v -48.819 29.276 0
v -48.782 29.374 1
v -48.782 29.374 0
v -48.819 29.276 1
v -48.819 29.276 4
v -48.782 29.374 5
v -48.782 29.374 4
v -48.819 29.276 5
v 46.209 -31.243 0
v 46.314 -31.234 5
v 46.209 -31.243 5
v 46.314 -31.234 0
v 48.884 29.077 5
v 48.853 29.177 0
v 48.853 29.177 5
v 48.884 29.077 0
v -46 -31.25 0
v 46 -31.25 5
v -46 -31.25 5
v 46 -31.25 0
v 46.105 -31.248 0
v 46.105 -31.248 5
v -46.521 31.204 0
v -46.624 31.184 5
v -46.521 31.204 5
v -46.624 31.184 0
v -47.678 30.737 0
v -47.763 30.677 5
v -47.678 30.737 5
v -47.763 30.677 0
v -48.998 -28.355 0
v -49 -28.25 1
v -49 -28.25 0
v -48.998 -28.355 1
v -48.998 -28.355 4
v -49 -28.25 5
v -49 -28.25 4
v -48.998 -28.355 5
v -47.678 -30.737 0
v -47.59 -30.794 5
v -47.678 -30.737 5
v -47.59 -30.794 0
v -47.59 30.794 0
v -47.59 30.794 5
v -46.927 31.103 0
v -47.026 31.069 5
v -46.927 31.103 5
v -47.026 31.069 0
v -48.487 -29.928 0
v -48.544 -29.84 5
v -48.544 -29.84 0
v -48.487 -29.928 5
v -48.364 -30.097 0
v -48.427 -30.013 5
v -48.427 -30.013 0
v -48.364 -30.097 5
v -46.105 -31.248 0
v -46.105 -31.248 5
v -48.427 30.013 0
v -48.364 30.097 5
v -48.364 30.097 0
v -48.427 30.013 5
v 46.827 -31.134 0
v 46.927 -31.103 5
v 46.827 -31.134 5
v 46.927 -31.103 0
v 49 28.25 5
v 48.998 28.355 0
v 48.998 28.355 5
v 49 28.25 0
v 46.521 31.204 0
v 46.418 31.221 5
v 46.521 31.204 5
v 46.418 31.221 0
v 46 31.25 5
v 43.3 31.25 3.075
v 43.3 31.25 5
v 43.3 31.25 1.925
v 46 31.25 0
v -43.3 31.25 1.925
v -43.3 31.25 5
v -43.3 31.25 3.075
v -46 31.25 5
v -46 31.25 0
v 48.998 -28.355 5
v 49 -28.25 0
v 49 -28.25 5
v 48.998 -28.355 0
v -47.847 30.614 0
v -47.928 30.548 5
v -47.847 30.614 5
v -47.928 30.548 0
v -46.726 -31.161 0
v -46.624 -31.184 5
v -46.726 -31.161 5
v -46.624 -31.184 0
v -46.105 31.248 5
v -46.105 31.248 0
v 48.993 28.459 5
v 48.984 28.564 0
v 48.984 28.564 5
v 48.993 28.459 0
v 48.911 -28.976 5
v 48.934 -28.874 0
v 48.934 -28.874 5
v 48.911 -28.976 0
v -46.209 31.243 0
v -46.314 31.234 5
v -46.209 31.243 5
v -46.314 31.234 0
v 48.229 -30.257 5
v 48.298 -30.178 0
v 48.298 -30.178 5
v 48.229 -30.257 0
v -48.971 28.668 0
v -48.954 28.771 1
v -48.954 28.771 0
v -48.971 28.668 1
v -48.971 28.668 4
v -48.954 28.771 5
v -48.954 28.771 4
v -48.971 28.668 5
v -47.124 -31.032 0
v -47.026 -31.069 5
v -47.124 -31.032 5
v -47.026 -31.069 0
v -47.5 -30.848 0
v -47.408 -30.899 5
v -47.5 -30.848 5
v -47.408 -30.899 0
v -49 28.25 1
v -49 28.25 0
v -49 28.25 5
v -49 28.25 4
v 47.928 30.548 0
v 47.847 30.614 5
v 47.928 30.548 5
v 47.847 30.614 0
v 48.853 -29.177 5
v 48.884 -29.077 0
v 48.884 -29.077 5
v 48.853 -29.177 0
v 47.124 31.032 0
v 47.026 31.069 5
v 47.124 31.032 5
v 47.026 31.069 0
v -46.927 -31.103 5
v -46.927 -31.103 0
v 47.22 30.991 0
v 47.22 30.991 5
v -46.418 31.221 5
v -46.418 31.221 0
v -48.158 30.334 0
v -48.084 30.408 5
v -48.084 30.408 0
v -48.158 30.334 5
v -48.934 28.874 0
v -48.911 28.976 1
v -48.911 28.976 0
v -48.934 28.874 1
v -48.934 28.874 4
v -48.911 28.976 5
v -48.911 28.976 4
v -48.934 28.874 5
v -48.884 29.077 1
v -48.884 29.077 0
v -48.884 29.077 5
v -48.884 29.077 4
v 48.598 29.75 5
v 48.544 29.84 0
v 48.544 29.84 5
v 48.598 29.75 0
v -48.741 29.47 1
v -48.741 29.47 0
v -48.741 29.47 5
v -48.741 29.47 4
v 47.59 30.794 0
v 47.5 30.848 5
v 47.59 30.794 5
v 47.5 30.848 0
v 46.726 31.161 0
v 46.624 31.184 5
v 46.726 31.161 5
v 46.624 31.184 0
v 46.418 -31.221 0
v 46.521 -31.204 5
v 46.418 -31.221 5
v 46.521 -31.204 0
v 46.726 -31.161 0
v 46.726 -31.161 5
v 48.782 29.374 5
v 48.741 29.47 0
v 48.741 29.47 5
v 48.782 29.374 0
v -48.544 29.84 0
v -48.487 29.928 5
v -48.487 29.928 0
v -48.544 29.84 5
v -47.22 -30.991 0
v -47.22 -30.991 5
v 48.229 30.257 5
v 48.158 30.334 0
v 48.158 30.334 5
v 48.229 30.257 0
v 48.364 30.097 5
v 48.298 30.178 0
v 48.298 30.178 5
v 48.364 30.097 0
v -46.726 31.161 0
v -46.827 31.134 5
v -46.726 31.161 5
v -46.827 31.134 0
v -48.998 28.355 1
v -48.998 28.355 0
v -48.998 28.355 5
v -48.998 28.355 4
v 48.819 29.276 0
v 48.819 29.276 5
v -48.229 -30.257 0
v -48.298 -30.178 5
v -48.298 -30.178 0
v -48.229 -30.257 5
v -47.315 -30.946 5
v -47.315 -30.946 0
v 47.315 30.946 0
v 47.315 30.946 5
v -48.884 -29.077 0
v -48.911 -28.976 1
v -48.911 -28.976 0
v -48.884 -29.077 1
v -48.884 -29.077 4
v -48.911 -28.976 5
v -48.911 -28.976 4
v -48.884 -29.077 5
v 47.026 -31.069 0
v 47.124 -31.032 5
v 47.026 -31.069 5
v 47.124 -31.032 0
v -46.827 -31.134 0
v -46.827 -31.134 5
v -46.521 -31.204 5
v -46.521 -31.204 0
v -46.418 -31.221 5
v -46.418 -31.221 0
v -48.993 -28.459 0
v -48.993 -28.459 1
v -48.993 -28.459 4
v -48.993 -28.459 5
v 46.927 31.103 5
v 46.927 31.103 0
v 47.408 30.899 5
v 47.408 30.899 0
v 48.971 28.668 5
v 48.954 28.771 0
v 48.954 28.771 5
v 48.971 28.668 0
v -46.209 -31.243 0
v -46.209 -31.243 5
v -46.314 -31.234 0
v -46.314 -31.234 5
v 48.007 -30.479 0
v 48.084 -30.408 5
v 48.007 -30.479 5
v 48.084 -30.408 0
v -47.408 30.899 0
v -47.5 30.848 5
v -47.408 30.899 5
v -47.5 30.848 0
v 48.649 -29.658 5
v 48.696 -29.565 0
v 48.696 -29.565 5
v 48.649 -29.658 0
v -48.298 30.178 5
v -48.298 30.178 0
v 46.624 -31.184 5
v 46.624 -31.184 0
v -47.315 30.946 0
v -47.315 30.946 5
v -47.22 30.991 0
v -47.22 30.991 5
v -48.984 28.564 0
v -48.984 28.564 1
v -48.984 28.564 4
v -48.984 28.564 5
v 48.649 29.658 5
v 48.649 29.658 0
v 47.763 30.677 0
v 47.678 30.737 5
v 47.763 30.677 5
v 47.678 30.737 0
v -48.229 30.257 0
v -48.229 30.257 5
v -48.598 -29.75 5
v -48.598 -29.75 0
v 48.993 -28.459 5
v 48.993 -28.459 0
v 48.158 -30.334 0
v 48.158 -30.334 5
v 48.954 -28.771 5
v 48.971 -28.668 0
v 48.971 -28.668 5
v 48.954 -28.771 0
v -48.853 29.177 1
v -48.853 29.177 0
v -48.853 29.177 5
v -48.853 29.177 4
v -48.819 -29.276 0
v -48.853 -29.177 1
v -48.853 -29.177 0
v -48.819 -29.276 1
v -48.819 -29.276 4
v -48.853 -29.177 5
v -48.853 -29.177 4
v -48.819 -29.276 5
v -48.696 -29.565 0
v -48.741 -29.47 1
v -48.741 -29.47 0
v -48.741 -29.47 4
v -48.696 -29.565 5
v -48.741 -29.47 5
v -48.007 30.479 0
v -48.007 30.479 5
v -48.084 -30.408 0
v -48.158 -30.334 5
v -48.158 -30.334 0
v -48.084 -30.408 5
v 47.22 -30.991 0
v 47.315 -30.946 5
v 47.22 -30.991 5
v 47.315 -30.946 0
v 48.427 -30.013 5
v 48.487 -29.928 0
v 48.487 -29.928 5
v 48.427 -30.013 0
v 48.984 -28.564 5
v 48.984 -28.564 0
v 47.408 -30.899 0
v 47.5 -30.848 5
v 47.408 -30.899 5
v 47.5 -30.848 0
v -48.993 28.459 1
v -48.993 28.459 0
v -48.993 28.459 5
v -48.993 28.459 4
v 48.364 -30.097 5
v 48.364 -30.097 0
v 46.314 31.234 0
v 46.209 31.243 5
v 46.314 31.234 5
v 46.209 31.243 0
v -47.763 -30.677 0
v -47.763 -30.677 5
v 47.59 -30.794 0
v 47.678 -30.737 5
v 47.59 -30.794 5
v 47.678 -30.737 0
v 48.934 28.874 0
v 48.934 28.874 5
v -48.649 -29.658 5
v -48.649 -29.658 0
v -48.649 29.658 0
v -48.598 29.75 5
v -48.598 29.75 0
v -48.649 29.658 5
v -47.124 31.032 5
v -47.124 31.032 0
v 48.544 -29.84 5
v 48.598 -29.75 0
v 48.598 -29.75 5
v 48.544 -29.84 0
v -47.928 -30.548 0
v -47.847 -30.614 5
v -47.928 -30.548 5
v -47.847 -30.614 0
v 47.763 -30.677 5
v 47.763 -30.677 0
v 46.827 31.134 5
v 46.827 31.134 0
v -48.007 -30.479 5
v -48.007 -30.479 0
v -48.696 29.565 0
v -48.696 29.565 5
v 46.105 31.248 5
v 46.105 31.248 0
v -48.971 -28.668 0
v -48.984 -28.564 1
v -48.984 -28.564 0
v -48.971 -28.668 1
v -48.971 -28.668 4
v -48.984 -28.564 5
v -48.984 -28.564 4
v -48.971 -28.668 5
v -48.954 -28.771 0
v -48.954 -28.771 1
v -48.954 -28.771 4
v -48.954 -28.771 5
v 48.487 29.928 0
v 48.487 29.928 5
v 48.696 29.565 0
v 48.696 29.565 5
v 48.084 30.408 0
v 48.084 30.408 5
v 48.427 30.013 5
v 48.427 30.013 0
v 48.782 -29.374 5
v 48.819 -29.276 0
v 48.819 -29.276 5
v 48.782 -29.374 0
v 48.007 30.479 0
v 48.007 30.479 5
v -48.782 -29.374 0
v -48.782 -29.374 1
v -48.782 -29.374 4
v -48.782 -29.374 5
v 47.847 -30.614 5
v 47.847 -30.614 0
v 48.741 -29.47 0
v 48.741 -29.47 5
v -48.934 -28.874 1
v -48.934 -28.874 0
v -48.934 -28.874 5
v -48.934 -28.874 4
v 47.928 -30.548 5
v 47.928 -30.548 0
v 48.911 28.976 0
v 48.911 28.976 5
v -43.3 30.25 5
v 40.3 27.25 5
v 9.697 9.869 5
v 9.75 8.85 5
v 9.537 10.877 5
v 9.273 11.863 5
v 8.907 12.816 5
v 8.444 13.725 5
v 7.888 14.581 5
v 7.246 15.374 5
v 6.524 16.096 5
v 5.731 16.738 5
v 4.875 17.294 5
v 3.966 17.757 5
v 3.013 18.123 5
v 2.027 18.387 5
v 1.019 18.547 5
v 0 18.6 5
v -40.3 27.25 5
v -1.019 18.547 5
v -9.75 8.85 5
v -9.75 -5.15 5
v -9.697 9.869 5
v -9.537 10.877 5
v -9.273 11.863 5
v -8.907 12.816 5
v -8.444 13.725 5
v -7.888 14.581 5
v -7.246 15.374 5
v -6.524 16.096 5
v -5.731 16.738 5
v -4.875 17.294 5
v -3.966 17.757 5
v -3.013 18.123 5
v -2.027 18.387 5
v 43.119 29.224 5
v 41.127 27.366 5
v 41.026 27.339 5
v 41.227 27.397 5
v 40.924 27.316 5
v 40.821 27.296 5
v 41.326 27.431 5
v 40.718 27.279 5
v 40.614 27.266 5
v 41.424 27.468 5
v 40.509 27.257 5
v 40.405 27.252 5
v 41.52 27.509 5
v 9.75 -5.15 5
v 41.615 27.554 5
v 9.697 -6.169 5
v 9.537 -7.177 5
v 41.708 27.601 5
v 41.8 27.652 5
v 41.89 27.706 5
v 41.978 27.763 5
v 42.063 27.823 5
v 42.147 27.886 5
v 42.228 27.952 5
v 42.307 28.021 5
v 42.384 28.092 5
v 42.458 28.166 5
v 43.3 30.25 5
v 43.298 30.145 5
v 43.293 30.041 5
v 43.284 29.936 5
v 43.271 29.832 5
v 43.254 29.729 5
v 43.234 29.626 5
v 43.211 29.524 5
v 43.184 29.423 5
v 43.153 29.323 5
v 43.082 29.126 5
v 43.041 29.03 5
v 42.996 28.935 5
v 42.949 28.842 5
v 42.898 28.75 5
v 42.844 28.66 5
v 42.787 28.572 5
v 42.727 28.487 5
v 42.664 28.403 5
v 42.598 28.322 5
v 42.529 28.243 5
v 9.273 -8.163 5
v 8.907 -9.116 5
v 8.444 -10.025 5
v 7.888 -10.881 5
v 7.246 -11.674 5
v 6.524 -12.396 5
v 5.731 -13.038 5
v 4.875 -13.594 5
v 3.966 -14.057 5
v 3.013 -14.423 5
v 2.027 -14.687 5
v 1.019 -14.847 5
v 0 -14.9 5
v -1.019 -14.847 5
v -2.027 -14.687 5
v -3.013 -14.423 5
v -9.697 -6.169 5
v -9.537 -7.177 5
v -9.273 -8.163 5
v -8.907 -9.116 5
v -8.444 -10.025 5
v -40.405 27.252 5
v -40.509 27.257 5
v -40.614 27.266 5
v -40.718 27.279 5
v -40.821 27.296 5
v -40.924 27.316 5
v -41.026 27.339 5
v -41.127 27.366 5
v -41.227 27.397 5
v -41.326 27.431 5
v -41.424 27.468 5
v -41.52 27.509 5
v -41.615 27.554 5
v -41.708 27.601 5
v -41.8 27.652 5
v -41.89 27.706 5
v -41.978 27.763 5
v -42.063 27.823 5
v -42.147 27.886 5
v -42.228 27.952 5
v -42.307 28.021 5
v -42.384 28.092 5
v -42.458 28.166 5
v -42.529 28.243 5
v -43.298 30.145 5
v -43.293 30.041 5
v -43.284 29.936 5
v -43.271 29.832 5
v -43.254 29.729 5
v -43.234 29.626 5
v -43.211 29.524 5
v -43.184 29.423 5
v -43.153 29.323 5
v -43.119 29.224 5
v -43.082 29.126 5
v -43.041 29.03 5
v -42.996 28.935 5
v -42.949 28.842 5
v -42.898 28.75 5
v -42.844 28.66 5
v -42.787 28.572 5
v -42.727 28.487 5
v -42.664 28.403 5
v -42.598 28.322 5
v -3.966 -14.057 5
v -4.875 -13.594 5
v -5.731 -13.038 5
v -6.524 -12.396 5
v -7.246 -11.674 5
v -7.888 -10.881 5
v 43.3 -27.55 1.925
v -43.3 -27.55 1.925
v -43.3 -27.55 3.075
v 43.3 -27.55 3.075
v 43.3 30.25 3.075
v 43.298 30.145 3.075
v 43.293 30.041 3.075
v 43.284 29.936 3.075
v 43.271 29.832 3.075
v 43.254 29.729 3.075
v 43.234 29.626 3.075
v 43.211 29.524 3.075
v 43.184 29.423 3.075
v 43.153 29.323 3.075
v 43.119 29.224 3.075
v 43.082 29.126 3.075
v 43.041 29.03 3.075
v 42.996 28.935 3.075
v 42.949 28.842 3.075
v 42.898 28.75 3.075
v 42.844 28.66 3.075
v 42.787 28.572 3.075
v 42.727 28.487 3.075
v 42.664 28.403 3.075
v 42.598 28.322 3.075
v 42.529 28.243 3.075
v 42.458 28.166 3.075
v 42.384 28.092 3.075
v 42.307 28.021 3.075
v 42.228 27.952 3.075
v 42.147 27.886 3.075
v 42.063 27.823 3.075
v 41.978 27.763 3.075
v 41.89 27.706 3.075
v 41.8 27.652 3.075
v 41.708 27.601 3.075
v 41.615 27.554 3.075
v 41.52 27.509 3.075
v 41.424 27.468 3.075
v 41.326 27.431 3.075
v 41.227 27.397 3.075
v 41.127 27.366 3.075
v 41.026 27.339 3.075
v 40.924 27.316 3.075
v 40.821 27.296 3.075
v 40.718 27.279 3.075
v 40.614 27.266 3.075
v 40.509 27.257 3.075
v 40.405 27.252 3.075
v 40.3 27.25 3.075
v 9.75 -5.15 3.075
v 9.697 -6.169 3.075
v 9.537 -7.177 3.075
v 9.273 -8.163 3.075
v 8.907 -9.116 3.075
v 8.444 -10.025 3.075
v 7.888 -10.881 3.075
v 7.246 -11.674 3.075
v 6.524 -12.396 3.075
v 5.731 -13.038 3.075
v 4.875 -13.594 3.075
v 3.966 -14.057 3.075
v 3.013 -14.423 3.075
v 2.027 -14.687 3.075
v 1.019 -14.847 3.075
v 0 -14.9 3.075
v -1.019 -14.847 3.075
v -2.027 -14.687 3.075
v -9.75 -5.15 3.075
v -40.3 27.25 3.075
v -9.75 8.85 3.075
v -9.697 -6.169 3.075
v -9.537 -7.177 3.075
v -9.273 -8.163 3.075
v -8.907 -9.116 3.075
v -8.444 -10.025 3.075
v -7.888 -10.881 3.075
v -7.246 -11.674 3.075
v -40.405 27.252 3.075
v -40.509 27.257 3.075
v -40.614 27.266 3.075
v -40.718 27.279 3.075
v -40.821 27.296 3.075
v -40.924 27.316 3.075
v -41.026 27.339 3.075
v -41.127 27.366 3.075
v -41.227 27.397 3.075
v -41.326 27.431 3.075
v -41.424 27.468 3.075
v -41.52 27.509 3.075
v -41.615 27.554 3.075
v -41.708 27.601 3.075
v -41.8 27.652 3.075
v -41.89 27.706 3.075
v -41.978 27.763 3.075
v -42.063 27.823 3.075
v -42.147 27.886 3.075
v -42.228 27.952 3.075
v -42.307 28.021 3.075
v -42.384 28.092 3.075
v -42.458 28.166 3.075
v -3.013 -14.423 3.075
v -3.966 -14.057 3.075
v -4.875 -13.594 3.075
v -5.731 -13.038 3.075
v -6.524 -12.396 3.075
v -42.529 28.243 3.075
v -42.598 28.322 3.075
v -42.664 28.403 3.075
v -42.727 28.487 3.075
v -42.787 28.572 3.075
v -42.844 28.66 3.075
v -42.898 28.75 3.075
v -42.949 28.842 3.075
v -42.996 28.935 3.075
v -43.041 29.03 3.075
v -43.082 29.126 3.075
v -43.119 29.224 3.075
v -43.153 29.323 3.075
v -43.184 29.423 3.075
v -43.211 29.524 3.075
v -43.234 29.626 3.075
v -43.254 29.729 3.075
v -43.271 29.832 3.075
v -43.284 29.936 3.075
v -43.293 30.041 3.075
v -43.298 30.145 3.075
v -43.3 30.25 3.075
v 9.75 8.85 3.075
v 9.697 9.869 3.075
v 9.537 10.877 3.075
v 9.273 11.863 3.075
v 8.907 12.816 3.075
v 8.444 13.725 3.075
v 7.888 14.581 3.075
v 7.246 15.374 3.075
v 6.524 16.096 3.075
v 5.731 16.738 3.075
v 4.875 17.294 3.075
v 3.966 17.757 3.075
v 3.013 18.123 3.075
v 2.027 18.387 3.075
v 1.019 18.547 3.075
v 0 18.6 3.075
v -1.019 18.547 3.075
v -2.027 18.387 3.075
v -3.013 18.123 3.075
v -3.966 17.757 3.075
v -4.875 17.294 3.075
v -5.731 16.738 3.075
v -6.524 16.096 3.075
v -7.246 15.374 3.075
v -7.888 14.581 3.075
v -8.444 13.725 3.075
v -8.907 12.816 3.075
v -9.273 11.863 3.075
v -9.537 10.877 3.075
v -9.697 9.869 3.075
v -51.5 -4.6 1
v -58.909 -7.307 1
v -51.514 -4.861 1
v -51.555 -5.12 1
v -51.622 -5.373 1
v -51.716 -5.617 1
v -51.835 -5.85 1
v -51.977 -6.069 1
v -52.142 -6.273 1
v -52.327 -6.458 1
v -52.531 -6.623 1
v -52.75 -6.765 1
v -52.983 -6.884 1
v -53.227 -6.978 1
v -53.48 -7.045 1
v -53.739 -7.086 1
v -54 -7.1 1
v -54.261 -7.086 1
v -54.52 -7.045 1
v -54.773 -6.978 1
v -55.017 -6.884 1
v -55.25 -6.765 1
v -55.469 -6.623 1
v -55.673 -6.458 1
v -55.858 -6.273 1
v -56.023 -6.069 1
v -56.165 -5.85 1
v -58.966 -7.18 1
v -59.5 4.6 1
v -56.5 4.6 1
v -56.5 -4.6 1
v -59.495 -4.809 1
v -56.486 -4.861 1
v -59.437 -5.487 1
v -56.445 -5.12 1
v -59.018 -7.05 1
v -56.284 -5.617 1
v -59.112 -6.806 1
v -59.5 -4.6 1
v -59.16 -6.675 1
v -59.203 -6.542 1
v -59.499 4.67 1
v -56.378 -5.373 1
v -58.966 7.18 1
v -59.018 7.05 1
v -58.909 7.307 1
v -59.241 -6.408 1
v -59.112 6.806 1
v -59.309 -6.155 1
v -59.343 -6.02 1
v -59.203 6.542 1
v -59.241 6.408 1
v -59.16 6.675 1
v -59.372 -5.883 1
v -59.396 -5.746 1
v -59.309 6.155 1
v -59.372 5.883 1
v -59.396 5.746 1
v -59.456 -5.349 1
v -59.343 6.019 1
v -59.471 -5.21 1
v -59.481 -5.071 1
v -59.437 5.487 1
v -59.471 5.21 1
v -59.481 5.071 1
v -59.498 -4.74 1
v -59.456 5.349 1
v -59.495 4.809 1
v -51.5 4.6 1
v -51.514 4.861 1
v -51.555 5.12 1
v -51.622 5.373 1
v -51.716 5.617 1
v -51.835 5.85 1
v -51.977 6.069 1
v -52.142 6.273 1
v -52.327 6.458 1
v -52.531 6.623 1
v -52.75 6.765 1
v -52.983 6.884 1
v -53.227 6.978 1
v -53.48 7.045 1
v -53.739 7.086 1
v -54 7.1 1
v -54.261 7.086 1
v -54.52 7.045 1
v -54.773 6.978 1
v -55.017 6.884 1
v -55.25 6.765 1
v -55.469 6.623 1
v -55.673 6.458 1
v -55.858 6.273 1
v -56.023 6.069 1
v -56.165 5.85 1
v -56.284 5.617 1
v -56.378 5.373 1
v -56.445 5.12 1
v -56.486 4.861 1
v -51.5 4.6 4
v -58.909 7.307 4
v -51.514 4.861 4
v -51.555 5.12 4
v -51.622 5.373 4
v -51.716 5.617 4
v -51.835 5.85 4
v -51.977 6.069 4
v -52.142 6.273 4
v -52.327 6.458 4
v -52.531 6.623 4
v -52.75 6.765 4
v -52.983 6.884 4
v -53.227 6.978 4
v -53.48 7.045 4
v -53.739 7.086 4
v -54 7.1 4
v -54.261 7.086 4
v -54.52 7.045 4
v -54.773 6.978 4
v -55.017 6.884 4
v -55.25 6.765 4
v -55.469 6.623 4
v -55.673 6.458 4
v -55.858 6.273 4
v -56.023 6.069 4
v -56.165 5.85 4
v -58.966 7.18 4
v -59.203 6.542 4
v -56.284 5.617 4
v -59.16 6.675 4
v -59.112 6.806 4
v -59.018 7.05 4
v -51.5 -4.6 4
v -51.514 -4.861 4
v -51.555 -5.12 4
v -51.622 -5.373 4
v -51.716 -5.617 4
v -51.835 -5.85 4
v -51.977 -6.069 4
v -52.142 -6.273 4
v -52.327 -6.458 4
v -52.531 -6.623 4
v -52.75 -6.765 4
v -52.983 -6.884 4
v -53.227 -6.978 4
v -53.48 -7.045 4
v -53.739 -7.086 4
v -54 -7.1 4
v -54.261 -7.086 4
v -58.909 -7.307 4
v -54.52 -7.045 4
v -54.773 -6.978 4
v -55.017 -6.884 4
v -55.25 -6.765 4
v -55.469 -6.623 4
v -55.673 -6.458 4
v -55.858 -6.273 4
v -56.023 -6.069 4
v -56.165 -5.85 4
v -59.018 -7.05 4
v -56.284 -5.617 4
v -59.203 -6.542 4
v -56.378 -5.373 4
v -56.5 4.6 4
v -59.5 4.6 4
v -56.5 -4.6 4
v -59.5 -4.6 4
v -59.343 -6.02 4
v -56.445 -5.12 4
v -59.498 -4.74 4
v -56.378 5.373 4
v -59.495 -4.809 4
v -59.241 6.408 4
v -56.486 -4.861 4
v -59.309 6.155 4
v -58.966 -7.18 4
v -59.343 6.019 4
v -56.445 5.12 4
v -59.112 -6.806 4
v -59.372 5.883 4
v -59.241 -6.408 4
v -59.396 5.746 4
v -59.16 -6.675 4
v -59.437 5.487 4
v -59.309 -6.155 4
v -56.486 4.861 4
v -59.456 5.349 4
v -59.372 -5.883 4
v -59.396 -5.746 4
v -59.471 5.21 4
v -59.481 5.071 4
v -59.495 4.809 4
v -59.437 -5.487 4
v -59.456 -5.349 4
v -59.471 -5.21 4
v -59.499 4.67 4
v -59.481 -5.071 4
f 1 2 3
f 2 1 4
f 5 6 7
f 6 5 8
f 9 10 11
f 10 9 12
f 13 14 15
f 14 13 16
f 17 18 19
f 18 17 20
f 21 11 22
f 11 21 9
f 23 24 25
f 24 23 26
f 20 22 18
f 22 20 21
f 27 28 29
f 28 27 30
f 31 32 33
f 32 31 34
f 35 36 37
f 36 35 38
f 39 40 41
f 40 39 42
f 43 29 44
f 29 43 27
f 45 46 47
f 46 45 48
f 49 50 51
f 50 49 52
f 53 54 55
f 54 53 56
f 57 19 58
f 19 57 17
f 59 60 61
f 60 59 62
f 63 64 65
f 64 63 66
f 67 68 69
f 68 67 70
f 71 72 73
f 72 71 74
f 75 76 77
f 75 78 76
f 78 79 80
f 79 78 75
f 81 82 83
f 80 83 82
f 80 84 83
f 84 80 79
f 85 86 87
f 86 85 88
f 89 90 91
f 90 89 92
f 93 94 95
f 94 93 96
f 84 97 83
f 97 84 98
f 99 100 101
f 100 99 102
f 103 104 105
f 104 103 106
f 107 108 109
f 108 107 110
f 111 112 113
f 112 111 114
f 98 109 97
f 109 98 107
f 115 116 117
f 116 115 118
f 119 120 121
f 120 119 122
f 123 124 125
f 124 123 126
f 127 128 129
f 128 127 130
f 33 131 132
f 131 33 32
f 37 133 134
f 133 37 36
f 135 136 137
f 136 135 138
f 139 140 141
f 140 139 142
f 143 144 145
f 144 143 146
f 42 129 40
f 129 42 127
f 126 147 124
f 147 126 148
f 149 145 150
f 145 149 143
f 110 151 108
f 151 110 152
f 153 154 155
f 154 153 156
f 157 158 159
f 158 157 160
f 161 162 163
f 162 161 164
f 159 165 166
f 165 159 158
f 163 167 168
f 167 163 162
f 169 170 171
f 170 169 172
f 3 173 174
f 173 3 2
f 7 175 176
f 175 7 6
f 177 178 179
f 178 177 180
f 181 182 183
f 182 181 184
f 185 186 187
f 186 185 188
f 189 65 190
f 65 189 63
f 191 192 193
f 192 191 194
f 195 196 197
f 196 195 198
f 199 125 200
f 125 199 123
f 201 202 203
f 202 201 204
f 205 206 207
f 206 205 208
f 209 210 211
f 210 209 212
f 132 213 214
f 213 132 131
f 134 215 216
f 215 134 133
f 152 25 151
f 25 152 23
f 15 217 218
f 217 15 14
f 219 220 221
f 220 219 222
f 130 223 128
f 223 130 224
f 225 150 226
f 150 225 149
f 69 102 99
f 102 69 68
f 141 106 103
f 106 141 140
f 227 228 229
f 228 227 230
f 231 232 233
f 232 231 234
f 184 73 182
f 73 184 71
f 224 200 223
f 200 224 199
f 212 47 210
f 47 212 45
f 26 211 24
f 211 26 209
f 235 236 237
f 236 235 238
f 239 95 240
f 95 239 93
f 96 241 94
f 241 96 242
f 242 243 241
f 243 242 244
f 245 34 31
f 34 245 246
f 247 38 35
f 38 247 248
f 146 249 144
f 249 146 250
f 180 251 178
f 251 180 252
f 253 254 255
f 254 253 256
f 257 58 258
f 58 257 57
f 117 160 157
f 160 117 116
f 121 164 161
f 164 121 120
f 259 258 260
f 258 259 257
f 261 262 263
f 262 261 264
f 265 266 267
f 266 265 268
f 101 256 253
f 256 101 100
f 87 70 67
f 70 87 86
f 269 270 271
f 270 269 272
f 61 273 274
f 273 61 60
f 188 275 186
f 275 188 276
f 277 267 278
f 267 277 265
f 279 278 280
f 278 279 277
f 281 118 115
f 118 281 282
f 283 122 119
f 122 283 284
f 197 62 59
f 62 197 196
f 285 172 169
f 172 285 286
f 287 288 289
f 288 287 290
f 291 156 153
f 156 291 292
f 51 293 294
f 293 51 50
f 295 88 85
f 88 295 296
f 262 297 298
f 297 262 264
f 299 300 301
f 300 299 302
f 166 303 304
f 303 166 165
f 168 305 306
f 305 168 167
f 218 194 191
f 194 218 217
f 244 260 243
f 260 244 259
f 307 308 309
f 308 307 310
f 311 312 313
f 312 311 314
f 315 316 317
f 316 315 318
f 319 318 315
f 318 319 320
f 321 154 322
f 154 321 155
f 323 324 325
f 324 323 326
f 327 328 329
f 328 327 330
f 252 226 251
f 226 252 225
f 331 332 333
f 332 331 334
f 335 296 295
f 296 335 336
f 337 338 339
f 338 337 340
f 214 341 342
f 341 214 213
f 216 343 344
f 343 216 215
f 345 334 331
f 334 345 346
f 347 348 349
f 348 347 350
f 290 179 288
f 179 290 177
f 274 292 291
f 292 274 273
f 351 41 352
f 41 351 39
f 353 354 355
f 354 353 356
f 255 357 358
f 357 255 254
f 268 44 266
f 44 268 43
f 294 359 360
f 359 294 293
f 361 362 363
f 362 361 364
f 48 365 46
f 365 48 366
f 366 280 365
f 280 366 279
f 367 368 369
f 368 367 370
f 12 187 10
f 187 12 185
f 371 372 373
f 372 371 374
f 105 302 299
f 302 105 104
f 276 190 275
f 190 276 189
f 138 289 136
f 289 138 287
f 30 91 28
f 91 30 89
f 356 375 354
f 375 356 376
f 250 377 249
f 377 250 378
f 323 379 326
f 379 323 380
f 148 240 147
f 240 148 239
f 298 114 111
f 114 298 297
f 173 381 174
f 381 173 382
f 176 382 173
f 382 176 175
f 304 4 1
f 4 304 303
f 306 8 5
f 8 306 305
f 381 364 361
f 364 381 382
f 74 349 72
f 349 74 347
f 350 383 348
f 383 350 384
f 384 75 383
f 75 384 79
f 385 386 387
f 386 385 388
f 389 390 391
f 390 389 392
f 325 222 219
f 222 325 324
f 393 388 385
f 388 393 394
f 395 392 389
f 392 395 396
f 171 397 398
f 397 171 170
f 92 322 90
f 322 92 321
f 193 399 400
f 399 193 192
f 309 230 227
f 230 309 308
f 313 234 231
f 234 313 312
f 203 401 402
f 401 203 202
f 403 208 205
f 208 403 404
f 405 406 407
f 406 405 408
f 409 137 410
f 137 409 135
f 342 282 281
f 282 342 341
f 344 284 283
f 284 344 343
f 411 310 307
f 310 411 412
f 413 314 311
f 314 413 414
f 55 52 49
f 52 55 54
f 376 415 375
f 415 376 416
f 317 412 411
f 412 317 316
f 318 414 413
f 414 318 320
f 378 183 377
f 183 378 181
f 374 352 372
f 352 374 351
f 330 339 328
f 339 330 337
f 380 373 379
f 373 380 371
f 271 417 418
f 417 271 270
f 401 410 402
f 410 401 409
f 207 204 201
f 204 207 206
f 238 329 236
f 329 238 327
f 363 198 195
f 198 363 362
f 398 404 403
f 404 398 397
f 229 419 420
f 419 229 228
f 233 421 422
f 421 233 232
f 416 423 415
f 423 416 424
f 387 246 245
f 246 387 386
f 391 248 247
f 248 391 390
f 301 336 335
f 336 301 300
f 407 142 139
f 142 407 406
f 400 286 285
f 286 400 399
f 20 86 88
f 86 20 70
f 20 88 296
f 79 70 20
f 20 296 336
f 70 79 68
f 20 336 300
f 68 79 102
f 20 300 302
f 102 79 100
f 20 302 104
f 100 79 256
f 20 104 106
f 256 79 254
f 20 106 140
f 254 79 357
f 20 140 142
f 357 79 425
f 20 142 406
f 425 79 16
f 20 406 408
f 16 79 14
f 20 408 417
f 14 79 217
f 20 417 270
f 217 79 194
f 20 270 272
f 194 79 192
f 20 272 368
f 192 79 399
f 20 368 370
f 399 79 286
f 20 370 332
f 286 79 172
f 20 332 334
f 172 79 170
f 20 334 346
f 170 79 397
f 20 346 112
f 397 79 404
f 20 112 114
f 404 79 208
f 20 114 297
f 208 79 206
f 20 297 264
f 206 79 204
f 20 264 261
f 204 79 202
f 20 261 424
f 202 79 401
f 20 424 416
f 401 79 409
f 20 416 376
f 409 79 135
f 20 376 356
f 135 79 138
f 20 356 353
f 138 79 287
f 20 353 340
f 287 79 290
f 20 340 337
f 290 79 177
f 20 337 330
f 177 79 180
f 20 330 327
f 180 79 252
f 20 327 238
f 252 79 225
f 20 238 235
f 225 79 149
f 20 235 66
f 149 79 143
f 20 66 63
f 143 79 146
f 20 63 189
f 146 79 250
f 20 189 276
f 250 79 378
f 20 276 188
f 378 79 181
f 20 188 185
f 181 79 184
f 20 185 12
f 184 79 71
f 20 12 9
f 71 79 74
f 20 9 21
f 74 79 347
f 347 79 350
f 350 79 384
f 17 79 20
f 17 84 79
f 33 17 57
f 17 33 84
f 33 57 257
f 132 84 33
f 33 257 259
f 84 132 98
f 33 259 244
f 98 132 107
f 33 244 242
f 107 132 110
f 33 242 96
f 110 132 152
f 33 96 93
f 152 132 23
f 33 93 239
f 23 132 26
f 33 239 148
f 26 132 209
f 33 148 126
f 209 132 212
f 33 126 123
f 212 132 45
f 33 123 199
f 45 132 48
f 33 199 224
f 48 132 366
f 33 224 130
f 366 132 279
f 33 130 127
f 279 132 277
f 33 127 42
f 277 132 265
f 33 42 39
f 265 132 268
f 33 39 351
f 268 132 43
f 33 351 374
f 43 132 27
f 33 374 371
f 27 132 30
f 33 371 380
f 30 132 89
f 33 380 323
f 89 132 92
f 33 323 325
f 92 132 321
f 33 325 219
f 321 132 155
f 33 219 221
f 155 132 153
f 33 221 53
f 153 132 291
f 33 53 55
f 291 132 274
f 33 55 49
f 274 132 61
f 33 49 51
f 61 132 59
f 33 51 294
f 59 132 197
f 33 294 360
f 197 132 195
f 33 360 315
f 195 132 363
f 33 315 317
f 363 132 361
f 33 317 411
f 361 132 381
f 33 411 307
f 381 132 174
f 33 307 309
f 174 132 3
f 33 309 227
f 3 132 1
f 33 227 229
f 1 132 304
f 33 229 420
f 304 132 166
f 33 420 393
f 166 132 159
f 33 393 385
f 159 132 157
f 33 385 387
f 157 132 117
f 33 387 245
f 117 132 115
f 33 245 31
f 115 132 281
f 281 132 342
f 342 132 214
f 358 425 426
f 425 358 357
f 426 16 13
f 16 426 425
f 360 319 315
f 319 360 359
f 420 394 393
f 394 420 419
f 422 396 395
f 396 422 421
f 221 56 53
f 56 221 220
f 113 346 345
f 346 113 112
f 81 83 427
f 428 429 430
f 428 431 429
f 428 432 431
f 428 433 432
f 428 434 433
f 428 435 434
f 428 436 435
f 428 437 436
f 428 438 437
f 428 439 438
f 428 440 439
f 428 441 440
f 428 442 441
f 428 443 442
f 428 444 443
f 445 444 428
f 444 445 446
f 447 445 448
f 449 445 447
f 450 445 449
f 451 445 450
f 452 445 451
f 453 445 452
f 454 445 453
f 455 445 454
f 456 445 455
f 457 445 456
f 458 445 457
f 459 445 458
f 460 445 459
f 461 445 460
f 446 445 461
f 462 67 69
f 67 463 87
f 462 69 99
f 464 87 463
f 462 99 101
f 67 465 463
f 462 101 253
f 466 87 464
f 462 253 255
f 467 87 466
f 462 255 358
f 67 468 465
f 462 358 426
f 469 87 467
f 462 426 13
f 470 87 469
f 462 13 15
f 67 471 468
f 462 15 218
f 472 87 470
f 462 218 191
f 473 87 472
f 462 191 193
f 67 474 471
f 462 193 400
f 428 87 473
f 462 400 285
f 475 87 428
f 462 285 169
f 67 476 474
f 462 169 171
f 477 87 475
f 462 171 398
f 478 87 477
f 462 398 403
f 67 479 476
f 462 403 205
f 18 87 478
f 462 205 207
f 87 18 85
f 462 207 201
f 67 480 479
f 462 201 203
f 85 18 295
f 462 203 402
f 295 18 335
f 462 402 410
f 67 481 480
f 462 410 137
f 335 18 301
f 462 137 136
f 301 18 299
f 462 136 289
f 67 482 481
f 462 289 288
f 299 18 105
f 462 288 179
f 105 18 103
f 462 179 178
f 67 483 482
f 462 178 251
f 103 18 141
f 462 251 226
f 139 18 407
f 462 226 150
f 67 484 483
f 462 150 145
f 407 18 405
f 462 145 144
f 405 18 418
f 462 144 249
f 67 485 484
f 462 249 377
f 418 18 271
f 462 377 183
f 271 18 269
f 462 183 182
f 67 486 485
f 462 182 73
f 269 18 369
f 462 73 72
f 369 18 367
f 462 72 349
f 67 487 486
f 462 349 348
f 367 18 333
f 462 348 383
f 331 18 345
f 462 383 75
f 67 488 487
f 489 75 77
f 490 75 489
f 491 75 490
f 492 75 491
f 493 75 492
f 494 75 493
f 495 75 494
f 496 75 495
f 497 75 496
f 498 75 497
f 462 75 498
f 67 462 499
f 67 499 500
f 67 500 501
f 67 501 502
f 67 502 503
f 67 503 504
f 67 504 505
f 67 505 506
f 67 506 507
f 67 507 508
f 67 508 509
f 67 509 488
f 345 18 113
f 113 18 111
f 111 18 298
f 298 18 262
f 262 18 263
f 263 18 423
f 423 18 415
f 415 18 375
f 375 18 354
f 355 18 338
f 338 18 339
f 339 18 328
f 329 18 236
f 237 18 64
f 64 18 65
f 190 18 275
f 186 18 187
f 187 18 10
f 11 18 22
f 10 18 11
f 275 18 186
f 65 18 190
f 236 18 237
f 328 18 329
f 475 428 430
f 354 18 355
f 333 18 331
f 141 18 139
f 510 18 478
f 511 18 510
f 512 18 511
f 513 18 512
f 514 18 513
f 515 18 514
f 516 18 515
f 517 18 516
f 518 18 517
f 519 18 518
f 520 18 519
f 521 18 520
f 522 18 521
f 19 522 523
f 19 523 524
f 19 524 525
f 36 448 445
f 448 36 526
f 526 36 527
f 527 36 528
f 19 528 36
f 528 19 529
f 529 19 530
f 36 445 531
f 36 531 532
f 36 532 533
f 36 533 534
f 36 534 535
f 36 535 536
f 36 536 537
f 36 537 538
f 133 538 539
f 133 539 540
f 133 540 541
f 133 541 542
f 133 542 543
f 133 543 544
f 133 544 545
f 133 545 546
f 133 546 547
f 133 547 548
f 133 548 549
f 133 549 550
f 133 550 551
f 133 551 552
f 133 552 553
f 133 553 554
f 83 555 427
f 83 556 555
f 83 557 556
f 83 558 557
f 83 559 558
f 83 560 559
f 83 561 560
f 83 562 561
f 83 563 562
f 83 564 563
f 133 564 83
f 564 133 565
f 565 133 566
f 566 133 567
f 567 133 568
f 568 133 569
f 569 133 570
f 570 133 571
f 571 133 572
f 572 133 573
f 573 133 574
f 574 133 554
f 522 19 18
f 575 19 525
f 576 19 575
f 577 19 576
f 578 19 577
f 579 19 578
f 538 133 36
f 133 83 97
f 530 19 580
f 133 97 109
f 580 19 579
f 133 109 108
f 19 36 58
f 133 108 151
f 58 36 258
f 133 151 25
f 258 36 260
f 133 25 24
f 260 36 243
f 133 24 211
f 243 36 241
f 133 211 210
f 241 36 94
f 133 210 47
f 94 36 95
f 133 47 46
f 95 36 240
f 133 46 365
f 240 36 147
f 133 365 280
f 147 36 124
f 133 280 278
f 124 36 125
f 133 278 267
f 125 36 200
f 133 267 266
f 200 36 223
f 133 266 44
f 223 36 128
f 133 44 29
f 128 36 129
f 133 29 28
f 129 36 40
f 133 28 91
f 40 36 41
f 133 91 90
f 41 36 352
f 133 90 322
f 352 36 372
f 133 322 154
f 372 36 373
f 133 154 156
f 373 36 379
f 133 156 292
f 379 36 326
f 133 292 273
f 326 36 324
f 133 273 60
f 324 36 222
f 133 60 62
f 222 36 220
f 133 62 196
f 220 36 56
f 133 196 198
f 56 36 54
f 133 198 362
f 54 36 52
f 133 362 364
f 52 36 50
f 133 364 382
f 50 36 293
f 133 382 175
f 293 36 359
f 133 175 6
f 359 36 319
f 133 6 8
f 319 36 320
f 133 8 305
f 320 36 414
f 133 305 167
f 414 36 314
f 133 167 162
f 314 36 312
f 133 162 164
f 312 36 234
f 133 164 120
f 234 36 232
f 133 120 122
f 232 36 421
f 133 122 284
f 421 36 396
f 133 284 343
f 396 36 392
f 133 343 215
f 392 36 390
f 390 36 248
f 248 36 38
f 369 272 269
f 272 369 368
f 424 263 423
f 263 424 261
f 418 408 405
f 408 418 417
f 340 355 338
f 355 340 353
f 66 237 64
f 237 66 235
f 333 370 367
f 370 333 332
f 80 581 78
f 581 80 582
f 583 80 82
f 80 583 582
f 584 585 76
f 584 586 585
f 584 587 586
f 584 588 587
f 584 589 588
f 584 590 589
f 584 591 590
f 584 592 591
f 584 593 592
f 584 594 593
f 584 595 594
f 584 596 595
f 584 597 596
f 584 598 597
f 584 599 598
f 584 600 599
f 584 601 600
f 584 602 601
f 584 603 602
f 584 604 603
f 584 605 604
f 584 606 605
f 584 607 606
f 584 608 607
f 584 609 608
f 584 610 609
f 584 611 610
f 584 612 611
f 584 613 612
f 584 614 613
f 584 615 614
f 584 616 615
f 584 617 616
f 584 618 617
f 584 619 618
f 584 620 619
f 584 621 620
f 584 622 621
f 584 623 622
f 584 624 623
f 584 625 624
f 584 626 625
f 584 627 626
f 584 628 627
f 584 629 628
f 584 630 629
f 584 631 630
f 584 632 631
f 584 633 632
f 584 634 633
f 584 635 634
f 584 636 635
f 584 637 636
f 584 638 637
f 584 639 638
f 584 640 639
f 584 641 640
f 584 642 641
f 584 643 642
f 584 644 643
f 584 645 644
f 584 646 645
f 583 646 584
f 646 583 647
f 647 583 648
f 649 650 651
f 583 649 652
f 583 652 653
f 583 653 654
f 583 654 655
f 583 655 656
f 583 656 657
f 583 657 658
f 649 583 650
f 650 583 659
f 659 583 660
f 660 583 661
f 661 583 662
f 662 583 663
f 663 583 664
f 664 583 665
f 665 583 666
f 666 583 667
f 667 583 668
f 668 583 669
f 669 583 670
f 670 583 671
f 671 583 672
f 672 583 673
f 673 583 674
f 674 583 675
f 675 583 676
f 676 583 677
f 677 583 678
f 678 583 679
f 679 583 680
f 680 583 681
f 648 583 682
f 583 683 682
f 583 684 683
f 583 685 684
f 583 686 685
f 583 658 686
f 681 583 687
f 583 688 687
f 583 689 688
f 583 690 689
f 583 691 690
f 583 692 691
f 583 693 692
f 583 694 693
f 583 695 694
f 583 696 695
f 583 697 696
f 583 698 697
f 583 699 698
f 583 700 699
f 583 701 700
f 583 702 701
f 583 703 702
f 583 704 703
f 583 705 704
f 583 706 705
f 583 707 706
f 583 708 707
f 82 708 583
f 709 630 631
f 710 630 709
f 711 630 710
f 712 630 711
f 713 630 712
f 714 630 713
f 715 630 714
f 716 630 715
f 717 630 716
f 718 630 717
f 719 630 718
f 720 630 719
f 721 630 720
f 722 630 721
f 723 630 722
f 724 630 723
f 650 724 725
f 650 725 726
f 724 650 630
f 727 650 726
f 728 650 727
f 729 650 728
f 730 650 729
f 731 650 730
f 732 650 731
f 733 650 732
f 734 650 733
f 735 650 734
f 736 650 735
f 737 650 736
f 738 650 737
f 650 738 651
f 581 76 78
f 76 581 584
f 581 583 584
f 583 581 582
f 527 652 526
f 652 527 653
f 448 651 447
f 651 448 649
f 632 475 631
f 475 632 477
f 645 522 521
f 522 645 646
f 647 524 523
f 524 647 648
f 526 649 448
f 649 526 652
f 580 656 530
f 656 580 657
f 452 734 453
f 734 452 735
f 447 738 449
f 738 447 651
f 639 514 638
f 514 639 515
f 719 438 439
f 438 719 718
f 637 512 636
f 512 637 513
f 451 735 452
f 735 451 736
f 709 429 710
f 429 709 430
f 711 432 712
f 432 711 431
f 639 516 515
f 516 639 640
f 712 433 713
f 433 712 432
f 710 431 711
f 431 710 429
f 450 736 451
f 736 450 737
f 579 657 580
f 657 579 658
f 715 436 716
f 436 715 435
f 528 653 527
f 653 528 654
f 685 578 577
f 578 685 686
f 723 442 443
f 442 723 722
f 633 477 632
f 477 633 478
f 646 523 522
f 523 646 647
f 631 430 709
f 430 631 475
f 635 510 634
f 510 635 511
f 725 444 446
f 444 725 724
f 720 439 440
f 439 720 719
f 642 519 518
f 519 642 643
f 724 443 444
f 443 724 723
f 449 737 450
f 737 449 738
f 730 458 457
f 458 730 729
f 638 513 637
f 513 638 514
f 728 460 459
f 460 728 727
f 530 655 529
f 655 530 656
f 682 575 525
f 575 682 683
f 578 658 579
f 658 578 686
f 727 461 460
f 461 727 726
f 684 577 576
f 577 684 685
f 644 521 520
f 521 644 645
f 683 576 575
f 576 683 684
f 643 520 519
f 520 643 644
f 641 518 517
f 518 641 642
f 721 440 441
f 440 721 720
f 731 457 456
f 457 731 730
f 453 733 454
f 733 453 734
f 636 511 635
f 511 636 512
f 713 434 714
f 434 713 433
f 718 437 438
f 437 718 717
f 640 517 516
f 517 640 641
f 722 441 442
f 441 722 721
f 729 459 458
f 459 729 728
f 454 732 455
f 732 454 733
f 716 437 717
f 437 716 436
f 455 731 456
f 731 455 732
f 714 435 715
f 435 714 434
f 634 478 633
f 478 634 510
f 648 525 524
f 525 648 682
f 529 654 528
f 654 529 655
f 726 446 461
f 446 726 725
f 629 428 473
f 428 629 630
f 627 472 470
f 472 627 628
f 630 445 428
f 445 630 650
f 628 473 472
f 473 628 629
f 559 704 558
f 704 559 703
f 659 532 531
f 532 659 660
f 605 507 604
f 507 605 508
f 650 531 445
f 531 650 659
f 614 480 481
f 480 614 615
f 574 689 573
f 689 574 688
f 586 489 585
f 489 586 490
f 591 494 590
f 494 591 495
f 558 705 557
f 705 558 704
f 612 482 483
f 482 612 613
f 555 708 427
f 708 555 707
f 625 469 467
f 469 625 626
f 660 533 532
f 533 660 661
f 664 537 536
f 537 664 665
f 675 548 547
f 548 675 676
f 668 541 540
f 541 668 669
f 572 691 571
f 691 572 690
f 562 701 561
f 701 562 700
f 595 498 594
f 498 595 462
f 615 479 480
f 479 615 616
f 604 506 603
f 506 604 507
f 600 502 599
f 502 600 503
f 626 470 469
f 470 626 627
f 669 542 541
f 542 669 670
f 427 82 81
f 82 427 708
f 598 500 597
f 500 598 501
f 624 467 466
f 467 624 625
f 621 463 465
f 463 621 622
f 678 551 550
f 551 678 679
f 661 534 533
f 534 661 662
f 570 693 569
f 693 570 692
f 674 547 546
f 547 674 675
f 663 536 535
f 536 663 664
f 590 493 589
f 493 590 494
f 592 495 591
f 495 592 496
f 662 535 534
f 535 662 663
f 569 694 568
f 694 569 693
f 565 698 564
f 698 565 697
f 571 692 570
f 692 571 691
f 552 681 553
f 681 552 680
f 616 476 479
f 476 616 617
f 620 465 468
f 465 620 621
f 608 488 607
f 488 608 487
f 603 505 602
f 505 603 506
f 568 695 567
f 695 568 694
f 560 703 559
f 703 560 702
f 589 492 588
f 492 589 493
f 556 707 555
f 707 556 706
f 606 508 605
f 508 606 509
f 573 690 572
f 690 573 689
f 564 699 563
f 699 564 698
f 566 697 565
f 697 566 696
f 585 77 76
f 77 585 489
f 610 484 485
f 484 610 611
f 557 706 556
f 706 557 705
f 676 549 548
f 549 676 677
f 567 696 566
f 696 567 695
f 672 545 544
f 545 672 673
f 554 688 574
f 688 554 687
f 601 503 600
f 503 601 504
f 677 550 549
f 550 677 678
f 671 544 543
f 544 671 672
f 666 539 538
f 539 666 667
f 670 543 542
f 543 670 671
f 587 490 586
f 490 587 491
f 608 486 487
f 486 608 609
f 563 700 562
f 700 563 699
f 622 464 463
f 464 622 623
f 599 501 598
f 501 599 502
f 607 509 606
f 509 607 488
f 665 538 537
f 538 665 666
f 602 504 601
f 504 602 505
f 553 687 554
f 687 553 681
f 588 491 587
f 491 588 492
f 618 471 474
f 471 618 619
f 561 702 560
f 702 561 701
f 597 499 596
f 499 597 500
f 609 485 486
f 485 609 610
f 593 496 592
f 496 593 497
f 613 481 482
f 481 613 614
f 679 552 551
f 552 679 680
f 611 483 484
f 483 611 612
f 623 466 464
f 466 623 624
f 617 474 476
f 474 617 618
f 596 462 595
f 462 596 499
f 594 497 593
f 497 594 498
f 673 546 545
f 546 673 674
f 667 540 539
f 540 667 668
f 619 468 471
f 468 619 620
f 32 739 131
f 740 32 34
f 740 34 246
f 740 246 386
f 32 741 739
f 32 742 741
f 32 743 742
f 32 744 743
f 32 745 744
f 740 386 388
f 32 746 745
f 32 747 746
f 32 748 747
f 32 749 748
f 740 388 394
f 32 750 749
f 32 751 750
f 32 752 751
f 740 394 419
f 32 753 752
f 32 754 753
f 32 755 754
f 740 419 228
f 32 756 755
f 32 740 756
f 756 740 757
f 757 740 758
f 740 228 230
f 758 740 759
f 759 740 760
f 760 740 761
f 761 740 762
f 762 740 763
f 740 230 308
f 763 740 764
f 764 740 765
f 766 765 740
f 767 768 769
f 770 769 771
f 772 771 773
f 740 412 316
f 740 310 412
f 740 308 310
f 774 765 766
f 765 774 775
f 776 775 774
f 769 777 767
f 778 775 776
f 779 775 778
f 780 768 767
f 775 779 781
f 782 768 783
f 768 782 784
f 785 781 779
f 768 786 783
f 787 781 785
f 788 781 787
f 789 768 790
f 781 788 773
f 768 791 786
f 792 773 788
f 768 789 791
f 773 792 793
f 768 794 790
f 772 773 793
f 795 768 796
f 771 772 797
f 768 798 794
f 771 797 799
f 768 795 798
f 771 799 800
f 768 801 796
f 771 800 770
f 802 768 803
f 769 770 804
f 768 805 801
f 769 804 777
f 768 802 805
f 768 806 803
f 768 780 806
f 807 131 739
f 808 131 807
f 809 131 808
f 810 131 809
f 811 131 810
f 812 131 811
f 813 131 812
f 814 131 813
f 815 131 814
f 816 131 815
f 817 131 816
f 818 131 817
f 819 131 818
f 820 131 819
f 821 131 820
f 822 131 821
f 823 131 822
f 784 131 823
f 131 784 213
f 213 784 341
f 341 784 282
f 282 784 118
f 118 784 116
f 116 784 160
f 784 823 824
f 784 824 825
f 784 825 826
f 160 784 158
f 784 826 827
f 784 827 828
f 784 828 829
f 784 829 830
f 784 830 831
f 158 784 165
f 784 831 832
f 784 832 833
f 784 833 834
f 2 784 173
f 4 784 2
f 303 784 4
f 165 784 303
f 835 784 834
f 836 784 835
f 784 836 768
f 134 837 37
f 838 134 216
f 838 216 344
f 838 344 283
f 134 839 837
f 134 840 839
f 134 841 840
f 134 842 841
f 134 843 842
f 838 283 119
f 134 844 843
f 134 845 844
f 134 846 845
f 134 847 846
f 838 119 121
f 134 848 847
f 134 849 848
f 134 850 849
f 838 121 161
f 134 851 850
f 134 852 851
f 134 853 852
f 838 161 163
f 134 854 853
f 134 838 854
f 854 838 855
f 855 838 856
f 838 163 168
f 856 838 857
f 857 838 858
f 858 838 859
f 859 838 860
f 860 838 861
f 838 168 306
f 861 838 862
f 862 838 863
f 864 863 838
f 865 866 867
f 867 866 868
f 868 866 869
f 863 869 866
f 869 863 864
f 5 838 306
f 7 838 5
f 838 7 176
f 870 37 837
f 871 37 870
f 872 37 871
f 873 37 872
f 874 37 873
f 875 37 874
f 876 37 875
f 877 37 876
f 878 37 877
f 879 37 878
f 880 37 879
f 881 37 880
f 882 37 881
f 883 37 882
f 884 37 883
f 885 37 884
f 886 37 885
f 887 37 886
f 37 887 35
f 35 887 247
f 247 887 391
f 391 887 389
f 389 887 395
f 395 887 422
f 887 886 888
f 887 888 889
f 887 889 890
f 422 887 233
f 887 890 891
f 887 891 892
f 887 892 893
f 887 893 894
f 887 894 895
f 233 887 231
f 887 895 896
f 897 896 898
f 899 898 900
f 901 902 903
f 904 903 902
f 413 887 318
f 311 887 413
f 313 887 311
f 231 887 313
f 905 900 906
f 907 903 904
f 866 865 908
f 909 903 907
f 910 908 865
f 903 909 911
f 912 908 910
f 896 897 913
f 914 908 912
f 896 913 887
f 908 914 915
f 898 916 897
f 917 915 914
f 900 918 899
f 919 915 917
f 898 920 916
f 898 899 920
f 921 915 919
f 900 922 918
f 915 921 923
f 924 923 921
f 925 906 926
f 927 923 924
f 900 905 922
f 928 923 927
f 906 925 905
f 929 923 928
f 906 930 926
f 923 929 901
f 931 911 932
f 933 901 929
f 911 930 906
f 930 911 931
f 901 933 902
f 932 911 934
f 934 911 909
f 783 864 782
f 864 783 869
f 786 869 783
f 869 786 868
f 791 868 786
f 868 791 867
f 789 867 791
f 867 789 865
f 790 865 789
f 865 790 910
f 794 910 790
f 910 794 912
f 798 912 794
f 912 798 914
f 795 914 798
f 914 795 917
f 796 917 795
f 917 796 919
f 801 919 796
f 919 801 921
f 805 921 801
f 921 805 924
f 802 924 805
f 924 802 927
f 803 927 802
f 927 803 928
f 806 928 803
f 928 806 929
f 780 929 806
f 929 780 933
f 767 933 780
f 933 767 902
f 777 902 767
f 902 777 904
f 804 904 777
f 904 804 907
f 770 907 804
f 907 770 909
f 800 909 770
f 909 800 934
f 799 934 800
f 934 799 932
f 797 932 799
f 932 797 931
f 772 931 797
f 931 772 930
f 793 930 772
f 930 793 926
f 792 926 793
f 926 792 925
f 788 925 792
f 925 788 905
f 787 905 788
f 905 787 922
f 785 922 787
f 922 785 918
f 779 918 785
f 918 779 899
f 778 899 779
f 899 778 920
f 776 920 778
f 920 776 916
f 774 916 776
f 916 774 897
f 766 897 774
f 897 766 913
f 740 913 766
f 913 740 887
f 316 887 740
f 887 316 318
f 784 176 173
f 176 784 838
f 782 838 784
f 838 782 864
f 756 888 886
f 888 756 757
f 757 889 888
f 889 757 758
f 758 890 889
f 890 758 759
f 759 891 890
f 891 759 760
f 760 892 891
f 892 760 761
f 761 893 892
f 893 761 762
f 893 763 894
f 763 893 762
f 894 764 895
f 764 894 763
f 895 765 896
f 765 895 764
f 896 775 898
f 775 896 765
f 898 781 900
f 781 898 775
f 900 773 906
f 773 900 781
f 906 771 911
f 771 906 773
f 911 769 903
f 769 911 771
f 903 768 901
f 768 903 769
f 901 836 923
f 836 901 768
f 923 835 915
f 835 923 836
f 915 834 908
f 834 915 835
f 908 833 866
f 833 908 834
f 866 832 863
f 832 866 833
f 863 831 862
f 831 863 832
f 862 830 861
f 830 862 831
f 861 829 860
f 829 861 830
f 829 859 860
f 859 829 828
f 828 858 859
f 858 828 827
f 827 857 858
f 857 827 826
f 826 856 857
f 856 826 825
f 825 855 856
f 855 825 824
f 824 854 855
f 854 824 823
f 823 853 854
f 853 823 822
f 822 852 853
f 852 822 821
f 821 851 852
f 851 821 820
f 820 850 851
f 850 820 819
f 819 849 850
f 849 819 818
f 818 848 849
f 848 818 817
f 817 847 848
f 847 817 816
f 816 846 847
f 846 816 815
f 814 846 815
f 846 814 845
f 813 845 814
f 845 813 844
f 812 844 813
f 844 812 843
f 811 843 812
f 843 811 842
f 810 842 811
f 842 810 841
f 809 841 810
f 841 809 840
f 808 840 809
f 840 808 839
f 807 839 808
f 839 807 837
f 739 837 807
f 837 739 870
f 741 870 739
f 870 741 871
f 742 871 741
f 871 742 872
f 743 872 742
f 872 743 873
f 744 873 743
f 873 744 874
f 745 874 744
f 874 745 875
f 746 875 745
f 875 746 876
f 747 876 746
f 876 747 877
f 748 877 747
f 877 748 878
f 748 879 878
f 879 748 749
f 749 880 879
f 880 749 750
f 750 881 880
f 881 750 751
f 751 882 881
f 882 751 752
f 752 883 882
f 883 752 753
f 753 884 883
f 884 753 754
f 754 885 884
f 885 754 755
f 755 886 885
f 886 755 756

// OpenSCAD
/*
// Notes:
// I have many modules that build on one
// beginning rectangle. I think I should have
// instead had many modules for the different
// holes and shapes, then joined them together
// in one module (to an extent; the ring
// attachment would be one part made up of
// multiple that would be entirely built
// separately and then unioned later, etc.).
*/

$fs=0.1;
$fa=2;

holderRounding = 3;
sliceRounding = 3;

fingerGapDia = 19.5;
fingerGapLen = 33.5-fingerGapDia;

cardSlotDims = [ // l,w,h
    86.6,
    53.8+5.0, // card rests 5mm inside of holder
    1.15,
];

ringHoleOffset=0;
ringHoleDia=5.0;
ringHoleLen=14.2-ringHoleDia;
ringWallThick=4.0;
ringAttachThick=3;

rimSliceDims = [
    cardSlotDims[0],
    4.0+sliceRounding
];

cardHolderDims = [ // l,w,h
    98.0, 
    62.5,
    5.0
];

module wantRect(l, w) {
    translate([-l/2,-w/2,0])
        square([l, w]);
}

module wantCirc(s) {
    circle(d=s,$fn=60);
}

module cardSlot2D() {
    wantRect(cardSlotDims[0], cardSlotDims[1]);
}

module cardSlot() {
    linear_extrude(height=cardSlotDims[2], convexity=4)
        cardSlot2D();
}

module cardHolder2D() {
    wantRect(cardHolderDims[0], cardHolderDims[1]);
}

module roundedCardHolder2D() {
    offset(r=holderRounding)
    offset(r=-holderRounding)
    cardHolder2D();
}

module cardHolder() {
    linear_extrude(height=cardHolderDims[2], convexity=4)
        roundedCardHolder2D();
}


cardElev=cardHolderDims[2]/2-cardSlotDims[2]/2;
cardOffset=(cardHolderDims[1]-cardSlotDims[1])/2;
module slottedHolder() {
    difference() {
        cardHolder();
        translate([0,cardOffset,cardElev])
            #cardSlot();
    }
}

module fingerGap2D() {
    hull() {
        translate([0,fingerGapLen/2,0])
        wantCirc(fingerGapDia);
        translate([0,-fingerGapLen/2,0])
        wantCirc(fingerGapDia);
    }

}

module fingerGap() {
    linear_extrude(height=cardHolderDims[2]/2, convexity=4)
        fingerGap2D();
}

module fingerGappedHolder() {
    difference() {
        slottedHolder();
        translate([0,cardOffset,cardHolderDims[2]/2])
        fingerGap();
    }
}

module rimSlice2D() {
    translate([0,cardHolderDims[1]/2-rimSliceDims[1]/2+sliceRounding,0])
    wantRect(rimSliceDims[0], rimSliceDims[1]);
}

module rimSlice() {
    translate([0,0,cardHolderDims[2]/2+cardSlotDims[2]/2])
    linear_extrude(height=cardHolderDims[2]/2, convexity=4)
        offset(r=sliceRounding) 
        offset(r=-sliceRounding)
        rimSlice2D();
}

module slicedCardHolder() {
    difference() {
        fingerGappedHolder();
        #rimSlice();
    }
}

module ringHole2D() {
    hull() {
        translate([0,ringHoleLen/2,0])
        wantCirc(ringHoleDia);
        translate([0,-ringHoleLen/2,0])
        wantCirc(ringHoleDia);
    }
}


module ringAttachment2D() {
    difference() {
    difference() {
        hull() {
            roundedCardHolder2D();
            translate([-cardHolderDims[0]/2-ringWallThick-ringHoleOffset,0,0])
            offset(r=ringWallThick)
            ringHole2D();
        }
        translate([-cardHolderDims[0]/2-ringHoleOffset-ringHoleDia,0,0])
        ringHole2D();
    }
    roundedCardHolder2D();
    }
}

module ringAttachment() {
    translate([0,0,cardHolderDims[2]/2-ringAttachThick/2])
    linear_extrude(height=ringAttachThick, convexity=4)
        ringAttachment2D();
}

union() {
slicedCardHolder();
ringAttachment();
}
